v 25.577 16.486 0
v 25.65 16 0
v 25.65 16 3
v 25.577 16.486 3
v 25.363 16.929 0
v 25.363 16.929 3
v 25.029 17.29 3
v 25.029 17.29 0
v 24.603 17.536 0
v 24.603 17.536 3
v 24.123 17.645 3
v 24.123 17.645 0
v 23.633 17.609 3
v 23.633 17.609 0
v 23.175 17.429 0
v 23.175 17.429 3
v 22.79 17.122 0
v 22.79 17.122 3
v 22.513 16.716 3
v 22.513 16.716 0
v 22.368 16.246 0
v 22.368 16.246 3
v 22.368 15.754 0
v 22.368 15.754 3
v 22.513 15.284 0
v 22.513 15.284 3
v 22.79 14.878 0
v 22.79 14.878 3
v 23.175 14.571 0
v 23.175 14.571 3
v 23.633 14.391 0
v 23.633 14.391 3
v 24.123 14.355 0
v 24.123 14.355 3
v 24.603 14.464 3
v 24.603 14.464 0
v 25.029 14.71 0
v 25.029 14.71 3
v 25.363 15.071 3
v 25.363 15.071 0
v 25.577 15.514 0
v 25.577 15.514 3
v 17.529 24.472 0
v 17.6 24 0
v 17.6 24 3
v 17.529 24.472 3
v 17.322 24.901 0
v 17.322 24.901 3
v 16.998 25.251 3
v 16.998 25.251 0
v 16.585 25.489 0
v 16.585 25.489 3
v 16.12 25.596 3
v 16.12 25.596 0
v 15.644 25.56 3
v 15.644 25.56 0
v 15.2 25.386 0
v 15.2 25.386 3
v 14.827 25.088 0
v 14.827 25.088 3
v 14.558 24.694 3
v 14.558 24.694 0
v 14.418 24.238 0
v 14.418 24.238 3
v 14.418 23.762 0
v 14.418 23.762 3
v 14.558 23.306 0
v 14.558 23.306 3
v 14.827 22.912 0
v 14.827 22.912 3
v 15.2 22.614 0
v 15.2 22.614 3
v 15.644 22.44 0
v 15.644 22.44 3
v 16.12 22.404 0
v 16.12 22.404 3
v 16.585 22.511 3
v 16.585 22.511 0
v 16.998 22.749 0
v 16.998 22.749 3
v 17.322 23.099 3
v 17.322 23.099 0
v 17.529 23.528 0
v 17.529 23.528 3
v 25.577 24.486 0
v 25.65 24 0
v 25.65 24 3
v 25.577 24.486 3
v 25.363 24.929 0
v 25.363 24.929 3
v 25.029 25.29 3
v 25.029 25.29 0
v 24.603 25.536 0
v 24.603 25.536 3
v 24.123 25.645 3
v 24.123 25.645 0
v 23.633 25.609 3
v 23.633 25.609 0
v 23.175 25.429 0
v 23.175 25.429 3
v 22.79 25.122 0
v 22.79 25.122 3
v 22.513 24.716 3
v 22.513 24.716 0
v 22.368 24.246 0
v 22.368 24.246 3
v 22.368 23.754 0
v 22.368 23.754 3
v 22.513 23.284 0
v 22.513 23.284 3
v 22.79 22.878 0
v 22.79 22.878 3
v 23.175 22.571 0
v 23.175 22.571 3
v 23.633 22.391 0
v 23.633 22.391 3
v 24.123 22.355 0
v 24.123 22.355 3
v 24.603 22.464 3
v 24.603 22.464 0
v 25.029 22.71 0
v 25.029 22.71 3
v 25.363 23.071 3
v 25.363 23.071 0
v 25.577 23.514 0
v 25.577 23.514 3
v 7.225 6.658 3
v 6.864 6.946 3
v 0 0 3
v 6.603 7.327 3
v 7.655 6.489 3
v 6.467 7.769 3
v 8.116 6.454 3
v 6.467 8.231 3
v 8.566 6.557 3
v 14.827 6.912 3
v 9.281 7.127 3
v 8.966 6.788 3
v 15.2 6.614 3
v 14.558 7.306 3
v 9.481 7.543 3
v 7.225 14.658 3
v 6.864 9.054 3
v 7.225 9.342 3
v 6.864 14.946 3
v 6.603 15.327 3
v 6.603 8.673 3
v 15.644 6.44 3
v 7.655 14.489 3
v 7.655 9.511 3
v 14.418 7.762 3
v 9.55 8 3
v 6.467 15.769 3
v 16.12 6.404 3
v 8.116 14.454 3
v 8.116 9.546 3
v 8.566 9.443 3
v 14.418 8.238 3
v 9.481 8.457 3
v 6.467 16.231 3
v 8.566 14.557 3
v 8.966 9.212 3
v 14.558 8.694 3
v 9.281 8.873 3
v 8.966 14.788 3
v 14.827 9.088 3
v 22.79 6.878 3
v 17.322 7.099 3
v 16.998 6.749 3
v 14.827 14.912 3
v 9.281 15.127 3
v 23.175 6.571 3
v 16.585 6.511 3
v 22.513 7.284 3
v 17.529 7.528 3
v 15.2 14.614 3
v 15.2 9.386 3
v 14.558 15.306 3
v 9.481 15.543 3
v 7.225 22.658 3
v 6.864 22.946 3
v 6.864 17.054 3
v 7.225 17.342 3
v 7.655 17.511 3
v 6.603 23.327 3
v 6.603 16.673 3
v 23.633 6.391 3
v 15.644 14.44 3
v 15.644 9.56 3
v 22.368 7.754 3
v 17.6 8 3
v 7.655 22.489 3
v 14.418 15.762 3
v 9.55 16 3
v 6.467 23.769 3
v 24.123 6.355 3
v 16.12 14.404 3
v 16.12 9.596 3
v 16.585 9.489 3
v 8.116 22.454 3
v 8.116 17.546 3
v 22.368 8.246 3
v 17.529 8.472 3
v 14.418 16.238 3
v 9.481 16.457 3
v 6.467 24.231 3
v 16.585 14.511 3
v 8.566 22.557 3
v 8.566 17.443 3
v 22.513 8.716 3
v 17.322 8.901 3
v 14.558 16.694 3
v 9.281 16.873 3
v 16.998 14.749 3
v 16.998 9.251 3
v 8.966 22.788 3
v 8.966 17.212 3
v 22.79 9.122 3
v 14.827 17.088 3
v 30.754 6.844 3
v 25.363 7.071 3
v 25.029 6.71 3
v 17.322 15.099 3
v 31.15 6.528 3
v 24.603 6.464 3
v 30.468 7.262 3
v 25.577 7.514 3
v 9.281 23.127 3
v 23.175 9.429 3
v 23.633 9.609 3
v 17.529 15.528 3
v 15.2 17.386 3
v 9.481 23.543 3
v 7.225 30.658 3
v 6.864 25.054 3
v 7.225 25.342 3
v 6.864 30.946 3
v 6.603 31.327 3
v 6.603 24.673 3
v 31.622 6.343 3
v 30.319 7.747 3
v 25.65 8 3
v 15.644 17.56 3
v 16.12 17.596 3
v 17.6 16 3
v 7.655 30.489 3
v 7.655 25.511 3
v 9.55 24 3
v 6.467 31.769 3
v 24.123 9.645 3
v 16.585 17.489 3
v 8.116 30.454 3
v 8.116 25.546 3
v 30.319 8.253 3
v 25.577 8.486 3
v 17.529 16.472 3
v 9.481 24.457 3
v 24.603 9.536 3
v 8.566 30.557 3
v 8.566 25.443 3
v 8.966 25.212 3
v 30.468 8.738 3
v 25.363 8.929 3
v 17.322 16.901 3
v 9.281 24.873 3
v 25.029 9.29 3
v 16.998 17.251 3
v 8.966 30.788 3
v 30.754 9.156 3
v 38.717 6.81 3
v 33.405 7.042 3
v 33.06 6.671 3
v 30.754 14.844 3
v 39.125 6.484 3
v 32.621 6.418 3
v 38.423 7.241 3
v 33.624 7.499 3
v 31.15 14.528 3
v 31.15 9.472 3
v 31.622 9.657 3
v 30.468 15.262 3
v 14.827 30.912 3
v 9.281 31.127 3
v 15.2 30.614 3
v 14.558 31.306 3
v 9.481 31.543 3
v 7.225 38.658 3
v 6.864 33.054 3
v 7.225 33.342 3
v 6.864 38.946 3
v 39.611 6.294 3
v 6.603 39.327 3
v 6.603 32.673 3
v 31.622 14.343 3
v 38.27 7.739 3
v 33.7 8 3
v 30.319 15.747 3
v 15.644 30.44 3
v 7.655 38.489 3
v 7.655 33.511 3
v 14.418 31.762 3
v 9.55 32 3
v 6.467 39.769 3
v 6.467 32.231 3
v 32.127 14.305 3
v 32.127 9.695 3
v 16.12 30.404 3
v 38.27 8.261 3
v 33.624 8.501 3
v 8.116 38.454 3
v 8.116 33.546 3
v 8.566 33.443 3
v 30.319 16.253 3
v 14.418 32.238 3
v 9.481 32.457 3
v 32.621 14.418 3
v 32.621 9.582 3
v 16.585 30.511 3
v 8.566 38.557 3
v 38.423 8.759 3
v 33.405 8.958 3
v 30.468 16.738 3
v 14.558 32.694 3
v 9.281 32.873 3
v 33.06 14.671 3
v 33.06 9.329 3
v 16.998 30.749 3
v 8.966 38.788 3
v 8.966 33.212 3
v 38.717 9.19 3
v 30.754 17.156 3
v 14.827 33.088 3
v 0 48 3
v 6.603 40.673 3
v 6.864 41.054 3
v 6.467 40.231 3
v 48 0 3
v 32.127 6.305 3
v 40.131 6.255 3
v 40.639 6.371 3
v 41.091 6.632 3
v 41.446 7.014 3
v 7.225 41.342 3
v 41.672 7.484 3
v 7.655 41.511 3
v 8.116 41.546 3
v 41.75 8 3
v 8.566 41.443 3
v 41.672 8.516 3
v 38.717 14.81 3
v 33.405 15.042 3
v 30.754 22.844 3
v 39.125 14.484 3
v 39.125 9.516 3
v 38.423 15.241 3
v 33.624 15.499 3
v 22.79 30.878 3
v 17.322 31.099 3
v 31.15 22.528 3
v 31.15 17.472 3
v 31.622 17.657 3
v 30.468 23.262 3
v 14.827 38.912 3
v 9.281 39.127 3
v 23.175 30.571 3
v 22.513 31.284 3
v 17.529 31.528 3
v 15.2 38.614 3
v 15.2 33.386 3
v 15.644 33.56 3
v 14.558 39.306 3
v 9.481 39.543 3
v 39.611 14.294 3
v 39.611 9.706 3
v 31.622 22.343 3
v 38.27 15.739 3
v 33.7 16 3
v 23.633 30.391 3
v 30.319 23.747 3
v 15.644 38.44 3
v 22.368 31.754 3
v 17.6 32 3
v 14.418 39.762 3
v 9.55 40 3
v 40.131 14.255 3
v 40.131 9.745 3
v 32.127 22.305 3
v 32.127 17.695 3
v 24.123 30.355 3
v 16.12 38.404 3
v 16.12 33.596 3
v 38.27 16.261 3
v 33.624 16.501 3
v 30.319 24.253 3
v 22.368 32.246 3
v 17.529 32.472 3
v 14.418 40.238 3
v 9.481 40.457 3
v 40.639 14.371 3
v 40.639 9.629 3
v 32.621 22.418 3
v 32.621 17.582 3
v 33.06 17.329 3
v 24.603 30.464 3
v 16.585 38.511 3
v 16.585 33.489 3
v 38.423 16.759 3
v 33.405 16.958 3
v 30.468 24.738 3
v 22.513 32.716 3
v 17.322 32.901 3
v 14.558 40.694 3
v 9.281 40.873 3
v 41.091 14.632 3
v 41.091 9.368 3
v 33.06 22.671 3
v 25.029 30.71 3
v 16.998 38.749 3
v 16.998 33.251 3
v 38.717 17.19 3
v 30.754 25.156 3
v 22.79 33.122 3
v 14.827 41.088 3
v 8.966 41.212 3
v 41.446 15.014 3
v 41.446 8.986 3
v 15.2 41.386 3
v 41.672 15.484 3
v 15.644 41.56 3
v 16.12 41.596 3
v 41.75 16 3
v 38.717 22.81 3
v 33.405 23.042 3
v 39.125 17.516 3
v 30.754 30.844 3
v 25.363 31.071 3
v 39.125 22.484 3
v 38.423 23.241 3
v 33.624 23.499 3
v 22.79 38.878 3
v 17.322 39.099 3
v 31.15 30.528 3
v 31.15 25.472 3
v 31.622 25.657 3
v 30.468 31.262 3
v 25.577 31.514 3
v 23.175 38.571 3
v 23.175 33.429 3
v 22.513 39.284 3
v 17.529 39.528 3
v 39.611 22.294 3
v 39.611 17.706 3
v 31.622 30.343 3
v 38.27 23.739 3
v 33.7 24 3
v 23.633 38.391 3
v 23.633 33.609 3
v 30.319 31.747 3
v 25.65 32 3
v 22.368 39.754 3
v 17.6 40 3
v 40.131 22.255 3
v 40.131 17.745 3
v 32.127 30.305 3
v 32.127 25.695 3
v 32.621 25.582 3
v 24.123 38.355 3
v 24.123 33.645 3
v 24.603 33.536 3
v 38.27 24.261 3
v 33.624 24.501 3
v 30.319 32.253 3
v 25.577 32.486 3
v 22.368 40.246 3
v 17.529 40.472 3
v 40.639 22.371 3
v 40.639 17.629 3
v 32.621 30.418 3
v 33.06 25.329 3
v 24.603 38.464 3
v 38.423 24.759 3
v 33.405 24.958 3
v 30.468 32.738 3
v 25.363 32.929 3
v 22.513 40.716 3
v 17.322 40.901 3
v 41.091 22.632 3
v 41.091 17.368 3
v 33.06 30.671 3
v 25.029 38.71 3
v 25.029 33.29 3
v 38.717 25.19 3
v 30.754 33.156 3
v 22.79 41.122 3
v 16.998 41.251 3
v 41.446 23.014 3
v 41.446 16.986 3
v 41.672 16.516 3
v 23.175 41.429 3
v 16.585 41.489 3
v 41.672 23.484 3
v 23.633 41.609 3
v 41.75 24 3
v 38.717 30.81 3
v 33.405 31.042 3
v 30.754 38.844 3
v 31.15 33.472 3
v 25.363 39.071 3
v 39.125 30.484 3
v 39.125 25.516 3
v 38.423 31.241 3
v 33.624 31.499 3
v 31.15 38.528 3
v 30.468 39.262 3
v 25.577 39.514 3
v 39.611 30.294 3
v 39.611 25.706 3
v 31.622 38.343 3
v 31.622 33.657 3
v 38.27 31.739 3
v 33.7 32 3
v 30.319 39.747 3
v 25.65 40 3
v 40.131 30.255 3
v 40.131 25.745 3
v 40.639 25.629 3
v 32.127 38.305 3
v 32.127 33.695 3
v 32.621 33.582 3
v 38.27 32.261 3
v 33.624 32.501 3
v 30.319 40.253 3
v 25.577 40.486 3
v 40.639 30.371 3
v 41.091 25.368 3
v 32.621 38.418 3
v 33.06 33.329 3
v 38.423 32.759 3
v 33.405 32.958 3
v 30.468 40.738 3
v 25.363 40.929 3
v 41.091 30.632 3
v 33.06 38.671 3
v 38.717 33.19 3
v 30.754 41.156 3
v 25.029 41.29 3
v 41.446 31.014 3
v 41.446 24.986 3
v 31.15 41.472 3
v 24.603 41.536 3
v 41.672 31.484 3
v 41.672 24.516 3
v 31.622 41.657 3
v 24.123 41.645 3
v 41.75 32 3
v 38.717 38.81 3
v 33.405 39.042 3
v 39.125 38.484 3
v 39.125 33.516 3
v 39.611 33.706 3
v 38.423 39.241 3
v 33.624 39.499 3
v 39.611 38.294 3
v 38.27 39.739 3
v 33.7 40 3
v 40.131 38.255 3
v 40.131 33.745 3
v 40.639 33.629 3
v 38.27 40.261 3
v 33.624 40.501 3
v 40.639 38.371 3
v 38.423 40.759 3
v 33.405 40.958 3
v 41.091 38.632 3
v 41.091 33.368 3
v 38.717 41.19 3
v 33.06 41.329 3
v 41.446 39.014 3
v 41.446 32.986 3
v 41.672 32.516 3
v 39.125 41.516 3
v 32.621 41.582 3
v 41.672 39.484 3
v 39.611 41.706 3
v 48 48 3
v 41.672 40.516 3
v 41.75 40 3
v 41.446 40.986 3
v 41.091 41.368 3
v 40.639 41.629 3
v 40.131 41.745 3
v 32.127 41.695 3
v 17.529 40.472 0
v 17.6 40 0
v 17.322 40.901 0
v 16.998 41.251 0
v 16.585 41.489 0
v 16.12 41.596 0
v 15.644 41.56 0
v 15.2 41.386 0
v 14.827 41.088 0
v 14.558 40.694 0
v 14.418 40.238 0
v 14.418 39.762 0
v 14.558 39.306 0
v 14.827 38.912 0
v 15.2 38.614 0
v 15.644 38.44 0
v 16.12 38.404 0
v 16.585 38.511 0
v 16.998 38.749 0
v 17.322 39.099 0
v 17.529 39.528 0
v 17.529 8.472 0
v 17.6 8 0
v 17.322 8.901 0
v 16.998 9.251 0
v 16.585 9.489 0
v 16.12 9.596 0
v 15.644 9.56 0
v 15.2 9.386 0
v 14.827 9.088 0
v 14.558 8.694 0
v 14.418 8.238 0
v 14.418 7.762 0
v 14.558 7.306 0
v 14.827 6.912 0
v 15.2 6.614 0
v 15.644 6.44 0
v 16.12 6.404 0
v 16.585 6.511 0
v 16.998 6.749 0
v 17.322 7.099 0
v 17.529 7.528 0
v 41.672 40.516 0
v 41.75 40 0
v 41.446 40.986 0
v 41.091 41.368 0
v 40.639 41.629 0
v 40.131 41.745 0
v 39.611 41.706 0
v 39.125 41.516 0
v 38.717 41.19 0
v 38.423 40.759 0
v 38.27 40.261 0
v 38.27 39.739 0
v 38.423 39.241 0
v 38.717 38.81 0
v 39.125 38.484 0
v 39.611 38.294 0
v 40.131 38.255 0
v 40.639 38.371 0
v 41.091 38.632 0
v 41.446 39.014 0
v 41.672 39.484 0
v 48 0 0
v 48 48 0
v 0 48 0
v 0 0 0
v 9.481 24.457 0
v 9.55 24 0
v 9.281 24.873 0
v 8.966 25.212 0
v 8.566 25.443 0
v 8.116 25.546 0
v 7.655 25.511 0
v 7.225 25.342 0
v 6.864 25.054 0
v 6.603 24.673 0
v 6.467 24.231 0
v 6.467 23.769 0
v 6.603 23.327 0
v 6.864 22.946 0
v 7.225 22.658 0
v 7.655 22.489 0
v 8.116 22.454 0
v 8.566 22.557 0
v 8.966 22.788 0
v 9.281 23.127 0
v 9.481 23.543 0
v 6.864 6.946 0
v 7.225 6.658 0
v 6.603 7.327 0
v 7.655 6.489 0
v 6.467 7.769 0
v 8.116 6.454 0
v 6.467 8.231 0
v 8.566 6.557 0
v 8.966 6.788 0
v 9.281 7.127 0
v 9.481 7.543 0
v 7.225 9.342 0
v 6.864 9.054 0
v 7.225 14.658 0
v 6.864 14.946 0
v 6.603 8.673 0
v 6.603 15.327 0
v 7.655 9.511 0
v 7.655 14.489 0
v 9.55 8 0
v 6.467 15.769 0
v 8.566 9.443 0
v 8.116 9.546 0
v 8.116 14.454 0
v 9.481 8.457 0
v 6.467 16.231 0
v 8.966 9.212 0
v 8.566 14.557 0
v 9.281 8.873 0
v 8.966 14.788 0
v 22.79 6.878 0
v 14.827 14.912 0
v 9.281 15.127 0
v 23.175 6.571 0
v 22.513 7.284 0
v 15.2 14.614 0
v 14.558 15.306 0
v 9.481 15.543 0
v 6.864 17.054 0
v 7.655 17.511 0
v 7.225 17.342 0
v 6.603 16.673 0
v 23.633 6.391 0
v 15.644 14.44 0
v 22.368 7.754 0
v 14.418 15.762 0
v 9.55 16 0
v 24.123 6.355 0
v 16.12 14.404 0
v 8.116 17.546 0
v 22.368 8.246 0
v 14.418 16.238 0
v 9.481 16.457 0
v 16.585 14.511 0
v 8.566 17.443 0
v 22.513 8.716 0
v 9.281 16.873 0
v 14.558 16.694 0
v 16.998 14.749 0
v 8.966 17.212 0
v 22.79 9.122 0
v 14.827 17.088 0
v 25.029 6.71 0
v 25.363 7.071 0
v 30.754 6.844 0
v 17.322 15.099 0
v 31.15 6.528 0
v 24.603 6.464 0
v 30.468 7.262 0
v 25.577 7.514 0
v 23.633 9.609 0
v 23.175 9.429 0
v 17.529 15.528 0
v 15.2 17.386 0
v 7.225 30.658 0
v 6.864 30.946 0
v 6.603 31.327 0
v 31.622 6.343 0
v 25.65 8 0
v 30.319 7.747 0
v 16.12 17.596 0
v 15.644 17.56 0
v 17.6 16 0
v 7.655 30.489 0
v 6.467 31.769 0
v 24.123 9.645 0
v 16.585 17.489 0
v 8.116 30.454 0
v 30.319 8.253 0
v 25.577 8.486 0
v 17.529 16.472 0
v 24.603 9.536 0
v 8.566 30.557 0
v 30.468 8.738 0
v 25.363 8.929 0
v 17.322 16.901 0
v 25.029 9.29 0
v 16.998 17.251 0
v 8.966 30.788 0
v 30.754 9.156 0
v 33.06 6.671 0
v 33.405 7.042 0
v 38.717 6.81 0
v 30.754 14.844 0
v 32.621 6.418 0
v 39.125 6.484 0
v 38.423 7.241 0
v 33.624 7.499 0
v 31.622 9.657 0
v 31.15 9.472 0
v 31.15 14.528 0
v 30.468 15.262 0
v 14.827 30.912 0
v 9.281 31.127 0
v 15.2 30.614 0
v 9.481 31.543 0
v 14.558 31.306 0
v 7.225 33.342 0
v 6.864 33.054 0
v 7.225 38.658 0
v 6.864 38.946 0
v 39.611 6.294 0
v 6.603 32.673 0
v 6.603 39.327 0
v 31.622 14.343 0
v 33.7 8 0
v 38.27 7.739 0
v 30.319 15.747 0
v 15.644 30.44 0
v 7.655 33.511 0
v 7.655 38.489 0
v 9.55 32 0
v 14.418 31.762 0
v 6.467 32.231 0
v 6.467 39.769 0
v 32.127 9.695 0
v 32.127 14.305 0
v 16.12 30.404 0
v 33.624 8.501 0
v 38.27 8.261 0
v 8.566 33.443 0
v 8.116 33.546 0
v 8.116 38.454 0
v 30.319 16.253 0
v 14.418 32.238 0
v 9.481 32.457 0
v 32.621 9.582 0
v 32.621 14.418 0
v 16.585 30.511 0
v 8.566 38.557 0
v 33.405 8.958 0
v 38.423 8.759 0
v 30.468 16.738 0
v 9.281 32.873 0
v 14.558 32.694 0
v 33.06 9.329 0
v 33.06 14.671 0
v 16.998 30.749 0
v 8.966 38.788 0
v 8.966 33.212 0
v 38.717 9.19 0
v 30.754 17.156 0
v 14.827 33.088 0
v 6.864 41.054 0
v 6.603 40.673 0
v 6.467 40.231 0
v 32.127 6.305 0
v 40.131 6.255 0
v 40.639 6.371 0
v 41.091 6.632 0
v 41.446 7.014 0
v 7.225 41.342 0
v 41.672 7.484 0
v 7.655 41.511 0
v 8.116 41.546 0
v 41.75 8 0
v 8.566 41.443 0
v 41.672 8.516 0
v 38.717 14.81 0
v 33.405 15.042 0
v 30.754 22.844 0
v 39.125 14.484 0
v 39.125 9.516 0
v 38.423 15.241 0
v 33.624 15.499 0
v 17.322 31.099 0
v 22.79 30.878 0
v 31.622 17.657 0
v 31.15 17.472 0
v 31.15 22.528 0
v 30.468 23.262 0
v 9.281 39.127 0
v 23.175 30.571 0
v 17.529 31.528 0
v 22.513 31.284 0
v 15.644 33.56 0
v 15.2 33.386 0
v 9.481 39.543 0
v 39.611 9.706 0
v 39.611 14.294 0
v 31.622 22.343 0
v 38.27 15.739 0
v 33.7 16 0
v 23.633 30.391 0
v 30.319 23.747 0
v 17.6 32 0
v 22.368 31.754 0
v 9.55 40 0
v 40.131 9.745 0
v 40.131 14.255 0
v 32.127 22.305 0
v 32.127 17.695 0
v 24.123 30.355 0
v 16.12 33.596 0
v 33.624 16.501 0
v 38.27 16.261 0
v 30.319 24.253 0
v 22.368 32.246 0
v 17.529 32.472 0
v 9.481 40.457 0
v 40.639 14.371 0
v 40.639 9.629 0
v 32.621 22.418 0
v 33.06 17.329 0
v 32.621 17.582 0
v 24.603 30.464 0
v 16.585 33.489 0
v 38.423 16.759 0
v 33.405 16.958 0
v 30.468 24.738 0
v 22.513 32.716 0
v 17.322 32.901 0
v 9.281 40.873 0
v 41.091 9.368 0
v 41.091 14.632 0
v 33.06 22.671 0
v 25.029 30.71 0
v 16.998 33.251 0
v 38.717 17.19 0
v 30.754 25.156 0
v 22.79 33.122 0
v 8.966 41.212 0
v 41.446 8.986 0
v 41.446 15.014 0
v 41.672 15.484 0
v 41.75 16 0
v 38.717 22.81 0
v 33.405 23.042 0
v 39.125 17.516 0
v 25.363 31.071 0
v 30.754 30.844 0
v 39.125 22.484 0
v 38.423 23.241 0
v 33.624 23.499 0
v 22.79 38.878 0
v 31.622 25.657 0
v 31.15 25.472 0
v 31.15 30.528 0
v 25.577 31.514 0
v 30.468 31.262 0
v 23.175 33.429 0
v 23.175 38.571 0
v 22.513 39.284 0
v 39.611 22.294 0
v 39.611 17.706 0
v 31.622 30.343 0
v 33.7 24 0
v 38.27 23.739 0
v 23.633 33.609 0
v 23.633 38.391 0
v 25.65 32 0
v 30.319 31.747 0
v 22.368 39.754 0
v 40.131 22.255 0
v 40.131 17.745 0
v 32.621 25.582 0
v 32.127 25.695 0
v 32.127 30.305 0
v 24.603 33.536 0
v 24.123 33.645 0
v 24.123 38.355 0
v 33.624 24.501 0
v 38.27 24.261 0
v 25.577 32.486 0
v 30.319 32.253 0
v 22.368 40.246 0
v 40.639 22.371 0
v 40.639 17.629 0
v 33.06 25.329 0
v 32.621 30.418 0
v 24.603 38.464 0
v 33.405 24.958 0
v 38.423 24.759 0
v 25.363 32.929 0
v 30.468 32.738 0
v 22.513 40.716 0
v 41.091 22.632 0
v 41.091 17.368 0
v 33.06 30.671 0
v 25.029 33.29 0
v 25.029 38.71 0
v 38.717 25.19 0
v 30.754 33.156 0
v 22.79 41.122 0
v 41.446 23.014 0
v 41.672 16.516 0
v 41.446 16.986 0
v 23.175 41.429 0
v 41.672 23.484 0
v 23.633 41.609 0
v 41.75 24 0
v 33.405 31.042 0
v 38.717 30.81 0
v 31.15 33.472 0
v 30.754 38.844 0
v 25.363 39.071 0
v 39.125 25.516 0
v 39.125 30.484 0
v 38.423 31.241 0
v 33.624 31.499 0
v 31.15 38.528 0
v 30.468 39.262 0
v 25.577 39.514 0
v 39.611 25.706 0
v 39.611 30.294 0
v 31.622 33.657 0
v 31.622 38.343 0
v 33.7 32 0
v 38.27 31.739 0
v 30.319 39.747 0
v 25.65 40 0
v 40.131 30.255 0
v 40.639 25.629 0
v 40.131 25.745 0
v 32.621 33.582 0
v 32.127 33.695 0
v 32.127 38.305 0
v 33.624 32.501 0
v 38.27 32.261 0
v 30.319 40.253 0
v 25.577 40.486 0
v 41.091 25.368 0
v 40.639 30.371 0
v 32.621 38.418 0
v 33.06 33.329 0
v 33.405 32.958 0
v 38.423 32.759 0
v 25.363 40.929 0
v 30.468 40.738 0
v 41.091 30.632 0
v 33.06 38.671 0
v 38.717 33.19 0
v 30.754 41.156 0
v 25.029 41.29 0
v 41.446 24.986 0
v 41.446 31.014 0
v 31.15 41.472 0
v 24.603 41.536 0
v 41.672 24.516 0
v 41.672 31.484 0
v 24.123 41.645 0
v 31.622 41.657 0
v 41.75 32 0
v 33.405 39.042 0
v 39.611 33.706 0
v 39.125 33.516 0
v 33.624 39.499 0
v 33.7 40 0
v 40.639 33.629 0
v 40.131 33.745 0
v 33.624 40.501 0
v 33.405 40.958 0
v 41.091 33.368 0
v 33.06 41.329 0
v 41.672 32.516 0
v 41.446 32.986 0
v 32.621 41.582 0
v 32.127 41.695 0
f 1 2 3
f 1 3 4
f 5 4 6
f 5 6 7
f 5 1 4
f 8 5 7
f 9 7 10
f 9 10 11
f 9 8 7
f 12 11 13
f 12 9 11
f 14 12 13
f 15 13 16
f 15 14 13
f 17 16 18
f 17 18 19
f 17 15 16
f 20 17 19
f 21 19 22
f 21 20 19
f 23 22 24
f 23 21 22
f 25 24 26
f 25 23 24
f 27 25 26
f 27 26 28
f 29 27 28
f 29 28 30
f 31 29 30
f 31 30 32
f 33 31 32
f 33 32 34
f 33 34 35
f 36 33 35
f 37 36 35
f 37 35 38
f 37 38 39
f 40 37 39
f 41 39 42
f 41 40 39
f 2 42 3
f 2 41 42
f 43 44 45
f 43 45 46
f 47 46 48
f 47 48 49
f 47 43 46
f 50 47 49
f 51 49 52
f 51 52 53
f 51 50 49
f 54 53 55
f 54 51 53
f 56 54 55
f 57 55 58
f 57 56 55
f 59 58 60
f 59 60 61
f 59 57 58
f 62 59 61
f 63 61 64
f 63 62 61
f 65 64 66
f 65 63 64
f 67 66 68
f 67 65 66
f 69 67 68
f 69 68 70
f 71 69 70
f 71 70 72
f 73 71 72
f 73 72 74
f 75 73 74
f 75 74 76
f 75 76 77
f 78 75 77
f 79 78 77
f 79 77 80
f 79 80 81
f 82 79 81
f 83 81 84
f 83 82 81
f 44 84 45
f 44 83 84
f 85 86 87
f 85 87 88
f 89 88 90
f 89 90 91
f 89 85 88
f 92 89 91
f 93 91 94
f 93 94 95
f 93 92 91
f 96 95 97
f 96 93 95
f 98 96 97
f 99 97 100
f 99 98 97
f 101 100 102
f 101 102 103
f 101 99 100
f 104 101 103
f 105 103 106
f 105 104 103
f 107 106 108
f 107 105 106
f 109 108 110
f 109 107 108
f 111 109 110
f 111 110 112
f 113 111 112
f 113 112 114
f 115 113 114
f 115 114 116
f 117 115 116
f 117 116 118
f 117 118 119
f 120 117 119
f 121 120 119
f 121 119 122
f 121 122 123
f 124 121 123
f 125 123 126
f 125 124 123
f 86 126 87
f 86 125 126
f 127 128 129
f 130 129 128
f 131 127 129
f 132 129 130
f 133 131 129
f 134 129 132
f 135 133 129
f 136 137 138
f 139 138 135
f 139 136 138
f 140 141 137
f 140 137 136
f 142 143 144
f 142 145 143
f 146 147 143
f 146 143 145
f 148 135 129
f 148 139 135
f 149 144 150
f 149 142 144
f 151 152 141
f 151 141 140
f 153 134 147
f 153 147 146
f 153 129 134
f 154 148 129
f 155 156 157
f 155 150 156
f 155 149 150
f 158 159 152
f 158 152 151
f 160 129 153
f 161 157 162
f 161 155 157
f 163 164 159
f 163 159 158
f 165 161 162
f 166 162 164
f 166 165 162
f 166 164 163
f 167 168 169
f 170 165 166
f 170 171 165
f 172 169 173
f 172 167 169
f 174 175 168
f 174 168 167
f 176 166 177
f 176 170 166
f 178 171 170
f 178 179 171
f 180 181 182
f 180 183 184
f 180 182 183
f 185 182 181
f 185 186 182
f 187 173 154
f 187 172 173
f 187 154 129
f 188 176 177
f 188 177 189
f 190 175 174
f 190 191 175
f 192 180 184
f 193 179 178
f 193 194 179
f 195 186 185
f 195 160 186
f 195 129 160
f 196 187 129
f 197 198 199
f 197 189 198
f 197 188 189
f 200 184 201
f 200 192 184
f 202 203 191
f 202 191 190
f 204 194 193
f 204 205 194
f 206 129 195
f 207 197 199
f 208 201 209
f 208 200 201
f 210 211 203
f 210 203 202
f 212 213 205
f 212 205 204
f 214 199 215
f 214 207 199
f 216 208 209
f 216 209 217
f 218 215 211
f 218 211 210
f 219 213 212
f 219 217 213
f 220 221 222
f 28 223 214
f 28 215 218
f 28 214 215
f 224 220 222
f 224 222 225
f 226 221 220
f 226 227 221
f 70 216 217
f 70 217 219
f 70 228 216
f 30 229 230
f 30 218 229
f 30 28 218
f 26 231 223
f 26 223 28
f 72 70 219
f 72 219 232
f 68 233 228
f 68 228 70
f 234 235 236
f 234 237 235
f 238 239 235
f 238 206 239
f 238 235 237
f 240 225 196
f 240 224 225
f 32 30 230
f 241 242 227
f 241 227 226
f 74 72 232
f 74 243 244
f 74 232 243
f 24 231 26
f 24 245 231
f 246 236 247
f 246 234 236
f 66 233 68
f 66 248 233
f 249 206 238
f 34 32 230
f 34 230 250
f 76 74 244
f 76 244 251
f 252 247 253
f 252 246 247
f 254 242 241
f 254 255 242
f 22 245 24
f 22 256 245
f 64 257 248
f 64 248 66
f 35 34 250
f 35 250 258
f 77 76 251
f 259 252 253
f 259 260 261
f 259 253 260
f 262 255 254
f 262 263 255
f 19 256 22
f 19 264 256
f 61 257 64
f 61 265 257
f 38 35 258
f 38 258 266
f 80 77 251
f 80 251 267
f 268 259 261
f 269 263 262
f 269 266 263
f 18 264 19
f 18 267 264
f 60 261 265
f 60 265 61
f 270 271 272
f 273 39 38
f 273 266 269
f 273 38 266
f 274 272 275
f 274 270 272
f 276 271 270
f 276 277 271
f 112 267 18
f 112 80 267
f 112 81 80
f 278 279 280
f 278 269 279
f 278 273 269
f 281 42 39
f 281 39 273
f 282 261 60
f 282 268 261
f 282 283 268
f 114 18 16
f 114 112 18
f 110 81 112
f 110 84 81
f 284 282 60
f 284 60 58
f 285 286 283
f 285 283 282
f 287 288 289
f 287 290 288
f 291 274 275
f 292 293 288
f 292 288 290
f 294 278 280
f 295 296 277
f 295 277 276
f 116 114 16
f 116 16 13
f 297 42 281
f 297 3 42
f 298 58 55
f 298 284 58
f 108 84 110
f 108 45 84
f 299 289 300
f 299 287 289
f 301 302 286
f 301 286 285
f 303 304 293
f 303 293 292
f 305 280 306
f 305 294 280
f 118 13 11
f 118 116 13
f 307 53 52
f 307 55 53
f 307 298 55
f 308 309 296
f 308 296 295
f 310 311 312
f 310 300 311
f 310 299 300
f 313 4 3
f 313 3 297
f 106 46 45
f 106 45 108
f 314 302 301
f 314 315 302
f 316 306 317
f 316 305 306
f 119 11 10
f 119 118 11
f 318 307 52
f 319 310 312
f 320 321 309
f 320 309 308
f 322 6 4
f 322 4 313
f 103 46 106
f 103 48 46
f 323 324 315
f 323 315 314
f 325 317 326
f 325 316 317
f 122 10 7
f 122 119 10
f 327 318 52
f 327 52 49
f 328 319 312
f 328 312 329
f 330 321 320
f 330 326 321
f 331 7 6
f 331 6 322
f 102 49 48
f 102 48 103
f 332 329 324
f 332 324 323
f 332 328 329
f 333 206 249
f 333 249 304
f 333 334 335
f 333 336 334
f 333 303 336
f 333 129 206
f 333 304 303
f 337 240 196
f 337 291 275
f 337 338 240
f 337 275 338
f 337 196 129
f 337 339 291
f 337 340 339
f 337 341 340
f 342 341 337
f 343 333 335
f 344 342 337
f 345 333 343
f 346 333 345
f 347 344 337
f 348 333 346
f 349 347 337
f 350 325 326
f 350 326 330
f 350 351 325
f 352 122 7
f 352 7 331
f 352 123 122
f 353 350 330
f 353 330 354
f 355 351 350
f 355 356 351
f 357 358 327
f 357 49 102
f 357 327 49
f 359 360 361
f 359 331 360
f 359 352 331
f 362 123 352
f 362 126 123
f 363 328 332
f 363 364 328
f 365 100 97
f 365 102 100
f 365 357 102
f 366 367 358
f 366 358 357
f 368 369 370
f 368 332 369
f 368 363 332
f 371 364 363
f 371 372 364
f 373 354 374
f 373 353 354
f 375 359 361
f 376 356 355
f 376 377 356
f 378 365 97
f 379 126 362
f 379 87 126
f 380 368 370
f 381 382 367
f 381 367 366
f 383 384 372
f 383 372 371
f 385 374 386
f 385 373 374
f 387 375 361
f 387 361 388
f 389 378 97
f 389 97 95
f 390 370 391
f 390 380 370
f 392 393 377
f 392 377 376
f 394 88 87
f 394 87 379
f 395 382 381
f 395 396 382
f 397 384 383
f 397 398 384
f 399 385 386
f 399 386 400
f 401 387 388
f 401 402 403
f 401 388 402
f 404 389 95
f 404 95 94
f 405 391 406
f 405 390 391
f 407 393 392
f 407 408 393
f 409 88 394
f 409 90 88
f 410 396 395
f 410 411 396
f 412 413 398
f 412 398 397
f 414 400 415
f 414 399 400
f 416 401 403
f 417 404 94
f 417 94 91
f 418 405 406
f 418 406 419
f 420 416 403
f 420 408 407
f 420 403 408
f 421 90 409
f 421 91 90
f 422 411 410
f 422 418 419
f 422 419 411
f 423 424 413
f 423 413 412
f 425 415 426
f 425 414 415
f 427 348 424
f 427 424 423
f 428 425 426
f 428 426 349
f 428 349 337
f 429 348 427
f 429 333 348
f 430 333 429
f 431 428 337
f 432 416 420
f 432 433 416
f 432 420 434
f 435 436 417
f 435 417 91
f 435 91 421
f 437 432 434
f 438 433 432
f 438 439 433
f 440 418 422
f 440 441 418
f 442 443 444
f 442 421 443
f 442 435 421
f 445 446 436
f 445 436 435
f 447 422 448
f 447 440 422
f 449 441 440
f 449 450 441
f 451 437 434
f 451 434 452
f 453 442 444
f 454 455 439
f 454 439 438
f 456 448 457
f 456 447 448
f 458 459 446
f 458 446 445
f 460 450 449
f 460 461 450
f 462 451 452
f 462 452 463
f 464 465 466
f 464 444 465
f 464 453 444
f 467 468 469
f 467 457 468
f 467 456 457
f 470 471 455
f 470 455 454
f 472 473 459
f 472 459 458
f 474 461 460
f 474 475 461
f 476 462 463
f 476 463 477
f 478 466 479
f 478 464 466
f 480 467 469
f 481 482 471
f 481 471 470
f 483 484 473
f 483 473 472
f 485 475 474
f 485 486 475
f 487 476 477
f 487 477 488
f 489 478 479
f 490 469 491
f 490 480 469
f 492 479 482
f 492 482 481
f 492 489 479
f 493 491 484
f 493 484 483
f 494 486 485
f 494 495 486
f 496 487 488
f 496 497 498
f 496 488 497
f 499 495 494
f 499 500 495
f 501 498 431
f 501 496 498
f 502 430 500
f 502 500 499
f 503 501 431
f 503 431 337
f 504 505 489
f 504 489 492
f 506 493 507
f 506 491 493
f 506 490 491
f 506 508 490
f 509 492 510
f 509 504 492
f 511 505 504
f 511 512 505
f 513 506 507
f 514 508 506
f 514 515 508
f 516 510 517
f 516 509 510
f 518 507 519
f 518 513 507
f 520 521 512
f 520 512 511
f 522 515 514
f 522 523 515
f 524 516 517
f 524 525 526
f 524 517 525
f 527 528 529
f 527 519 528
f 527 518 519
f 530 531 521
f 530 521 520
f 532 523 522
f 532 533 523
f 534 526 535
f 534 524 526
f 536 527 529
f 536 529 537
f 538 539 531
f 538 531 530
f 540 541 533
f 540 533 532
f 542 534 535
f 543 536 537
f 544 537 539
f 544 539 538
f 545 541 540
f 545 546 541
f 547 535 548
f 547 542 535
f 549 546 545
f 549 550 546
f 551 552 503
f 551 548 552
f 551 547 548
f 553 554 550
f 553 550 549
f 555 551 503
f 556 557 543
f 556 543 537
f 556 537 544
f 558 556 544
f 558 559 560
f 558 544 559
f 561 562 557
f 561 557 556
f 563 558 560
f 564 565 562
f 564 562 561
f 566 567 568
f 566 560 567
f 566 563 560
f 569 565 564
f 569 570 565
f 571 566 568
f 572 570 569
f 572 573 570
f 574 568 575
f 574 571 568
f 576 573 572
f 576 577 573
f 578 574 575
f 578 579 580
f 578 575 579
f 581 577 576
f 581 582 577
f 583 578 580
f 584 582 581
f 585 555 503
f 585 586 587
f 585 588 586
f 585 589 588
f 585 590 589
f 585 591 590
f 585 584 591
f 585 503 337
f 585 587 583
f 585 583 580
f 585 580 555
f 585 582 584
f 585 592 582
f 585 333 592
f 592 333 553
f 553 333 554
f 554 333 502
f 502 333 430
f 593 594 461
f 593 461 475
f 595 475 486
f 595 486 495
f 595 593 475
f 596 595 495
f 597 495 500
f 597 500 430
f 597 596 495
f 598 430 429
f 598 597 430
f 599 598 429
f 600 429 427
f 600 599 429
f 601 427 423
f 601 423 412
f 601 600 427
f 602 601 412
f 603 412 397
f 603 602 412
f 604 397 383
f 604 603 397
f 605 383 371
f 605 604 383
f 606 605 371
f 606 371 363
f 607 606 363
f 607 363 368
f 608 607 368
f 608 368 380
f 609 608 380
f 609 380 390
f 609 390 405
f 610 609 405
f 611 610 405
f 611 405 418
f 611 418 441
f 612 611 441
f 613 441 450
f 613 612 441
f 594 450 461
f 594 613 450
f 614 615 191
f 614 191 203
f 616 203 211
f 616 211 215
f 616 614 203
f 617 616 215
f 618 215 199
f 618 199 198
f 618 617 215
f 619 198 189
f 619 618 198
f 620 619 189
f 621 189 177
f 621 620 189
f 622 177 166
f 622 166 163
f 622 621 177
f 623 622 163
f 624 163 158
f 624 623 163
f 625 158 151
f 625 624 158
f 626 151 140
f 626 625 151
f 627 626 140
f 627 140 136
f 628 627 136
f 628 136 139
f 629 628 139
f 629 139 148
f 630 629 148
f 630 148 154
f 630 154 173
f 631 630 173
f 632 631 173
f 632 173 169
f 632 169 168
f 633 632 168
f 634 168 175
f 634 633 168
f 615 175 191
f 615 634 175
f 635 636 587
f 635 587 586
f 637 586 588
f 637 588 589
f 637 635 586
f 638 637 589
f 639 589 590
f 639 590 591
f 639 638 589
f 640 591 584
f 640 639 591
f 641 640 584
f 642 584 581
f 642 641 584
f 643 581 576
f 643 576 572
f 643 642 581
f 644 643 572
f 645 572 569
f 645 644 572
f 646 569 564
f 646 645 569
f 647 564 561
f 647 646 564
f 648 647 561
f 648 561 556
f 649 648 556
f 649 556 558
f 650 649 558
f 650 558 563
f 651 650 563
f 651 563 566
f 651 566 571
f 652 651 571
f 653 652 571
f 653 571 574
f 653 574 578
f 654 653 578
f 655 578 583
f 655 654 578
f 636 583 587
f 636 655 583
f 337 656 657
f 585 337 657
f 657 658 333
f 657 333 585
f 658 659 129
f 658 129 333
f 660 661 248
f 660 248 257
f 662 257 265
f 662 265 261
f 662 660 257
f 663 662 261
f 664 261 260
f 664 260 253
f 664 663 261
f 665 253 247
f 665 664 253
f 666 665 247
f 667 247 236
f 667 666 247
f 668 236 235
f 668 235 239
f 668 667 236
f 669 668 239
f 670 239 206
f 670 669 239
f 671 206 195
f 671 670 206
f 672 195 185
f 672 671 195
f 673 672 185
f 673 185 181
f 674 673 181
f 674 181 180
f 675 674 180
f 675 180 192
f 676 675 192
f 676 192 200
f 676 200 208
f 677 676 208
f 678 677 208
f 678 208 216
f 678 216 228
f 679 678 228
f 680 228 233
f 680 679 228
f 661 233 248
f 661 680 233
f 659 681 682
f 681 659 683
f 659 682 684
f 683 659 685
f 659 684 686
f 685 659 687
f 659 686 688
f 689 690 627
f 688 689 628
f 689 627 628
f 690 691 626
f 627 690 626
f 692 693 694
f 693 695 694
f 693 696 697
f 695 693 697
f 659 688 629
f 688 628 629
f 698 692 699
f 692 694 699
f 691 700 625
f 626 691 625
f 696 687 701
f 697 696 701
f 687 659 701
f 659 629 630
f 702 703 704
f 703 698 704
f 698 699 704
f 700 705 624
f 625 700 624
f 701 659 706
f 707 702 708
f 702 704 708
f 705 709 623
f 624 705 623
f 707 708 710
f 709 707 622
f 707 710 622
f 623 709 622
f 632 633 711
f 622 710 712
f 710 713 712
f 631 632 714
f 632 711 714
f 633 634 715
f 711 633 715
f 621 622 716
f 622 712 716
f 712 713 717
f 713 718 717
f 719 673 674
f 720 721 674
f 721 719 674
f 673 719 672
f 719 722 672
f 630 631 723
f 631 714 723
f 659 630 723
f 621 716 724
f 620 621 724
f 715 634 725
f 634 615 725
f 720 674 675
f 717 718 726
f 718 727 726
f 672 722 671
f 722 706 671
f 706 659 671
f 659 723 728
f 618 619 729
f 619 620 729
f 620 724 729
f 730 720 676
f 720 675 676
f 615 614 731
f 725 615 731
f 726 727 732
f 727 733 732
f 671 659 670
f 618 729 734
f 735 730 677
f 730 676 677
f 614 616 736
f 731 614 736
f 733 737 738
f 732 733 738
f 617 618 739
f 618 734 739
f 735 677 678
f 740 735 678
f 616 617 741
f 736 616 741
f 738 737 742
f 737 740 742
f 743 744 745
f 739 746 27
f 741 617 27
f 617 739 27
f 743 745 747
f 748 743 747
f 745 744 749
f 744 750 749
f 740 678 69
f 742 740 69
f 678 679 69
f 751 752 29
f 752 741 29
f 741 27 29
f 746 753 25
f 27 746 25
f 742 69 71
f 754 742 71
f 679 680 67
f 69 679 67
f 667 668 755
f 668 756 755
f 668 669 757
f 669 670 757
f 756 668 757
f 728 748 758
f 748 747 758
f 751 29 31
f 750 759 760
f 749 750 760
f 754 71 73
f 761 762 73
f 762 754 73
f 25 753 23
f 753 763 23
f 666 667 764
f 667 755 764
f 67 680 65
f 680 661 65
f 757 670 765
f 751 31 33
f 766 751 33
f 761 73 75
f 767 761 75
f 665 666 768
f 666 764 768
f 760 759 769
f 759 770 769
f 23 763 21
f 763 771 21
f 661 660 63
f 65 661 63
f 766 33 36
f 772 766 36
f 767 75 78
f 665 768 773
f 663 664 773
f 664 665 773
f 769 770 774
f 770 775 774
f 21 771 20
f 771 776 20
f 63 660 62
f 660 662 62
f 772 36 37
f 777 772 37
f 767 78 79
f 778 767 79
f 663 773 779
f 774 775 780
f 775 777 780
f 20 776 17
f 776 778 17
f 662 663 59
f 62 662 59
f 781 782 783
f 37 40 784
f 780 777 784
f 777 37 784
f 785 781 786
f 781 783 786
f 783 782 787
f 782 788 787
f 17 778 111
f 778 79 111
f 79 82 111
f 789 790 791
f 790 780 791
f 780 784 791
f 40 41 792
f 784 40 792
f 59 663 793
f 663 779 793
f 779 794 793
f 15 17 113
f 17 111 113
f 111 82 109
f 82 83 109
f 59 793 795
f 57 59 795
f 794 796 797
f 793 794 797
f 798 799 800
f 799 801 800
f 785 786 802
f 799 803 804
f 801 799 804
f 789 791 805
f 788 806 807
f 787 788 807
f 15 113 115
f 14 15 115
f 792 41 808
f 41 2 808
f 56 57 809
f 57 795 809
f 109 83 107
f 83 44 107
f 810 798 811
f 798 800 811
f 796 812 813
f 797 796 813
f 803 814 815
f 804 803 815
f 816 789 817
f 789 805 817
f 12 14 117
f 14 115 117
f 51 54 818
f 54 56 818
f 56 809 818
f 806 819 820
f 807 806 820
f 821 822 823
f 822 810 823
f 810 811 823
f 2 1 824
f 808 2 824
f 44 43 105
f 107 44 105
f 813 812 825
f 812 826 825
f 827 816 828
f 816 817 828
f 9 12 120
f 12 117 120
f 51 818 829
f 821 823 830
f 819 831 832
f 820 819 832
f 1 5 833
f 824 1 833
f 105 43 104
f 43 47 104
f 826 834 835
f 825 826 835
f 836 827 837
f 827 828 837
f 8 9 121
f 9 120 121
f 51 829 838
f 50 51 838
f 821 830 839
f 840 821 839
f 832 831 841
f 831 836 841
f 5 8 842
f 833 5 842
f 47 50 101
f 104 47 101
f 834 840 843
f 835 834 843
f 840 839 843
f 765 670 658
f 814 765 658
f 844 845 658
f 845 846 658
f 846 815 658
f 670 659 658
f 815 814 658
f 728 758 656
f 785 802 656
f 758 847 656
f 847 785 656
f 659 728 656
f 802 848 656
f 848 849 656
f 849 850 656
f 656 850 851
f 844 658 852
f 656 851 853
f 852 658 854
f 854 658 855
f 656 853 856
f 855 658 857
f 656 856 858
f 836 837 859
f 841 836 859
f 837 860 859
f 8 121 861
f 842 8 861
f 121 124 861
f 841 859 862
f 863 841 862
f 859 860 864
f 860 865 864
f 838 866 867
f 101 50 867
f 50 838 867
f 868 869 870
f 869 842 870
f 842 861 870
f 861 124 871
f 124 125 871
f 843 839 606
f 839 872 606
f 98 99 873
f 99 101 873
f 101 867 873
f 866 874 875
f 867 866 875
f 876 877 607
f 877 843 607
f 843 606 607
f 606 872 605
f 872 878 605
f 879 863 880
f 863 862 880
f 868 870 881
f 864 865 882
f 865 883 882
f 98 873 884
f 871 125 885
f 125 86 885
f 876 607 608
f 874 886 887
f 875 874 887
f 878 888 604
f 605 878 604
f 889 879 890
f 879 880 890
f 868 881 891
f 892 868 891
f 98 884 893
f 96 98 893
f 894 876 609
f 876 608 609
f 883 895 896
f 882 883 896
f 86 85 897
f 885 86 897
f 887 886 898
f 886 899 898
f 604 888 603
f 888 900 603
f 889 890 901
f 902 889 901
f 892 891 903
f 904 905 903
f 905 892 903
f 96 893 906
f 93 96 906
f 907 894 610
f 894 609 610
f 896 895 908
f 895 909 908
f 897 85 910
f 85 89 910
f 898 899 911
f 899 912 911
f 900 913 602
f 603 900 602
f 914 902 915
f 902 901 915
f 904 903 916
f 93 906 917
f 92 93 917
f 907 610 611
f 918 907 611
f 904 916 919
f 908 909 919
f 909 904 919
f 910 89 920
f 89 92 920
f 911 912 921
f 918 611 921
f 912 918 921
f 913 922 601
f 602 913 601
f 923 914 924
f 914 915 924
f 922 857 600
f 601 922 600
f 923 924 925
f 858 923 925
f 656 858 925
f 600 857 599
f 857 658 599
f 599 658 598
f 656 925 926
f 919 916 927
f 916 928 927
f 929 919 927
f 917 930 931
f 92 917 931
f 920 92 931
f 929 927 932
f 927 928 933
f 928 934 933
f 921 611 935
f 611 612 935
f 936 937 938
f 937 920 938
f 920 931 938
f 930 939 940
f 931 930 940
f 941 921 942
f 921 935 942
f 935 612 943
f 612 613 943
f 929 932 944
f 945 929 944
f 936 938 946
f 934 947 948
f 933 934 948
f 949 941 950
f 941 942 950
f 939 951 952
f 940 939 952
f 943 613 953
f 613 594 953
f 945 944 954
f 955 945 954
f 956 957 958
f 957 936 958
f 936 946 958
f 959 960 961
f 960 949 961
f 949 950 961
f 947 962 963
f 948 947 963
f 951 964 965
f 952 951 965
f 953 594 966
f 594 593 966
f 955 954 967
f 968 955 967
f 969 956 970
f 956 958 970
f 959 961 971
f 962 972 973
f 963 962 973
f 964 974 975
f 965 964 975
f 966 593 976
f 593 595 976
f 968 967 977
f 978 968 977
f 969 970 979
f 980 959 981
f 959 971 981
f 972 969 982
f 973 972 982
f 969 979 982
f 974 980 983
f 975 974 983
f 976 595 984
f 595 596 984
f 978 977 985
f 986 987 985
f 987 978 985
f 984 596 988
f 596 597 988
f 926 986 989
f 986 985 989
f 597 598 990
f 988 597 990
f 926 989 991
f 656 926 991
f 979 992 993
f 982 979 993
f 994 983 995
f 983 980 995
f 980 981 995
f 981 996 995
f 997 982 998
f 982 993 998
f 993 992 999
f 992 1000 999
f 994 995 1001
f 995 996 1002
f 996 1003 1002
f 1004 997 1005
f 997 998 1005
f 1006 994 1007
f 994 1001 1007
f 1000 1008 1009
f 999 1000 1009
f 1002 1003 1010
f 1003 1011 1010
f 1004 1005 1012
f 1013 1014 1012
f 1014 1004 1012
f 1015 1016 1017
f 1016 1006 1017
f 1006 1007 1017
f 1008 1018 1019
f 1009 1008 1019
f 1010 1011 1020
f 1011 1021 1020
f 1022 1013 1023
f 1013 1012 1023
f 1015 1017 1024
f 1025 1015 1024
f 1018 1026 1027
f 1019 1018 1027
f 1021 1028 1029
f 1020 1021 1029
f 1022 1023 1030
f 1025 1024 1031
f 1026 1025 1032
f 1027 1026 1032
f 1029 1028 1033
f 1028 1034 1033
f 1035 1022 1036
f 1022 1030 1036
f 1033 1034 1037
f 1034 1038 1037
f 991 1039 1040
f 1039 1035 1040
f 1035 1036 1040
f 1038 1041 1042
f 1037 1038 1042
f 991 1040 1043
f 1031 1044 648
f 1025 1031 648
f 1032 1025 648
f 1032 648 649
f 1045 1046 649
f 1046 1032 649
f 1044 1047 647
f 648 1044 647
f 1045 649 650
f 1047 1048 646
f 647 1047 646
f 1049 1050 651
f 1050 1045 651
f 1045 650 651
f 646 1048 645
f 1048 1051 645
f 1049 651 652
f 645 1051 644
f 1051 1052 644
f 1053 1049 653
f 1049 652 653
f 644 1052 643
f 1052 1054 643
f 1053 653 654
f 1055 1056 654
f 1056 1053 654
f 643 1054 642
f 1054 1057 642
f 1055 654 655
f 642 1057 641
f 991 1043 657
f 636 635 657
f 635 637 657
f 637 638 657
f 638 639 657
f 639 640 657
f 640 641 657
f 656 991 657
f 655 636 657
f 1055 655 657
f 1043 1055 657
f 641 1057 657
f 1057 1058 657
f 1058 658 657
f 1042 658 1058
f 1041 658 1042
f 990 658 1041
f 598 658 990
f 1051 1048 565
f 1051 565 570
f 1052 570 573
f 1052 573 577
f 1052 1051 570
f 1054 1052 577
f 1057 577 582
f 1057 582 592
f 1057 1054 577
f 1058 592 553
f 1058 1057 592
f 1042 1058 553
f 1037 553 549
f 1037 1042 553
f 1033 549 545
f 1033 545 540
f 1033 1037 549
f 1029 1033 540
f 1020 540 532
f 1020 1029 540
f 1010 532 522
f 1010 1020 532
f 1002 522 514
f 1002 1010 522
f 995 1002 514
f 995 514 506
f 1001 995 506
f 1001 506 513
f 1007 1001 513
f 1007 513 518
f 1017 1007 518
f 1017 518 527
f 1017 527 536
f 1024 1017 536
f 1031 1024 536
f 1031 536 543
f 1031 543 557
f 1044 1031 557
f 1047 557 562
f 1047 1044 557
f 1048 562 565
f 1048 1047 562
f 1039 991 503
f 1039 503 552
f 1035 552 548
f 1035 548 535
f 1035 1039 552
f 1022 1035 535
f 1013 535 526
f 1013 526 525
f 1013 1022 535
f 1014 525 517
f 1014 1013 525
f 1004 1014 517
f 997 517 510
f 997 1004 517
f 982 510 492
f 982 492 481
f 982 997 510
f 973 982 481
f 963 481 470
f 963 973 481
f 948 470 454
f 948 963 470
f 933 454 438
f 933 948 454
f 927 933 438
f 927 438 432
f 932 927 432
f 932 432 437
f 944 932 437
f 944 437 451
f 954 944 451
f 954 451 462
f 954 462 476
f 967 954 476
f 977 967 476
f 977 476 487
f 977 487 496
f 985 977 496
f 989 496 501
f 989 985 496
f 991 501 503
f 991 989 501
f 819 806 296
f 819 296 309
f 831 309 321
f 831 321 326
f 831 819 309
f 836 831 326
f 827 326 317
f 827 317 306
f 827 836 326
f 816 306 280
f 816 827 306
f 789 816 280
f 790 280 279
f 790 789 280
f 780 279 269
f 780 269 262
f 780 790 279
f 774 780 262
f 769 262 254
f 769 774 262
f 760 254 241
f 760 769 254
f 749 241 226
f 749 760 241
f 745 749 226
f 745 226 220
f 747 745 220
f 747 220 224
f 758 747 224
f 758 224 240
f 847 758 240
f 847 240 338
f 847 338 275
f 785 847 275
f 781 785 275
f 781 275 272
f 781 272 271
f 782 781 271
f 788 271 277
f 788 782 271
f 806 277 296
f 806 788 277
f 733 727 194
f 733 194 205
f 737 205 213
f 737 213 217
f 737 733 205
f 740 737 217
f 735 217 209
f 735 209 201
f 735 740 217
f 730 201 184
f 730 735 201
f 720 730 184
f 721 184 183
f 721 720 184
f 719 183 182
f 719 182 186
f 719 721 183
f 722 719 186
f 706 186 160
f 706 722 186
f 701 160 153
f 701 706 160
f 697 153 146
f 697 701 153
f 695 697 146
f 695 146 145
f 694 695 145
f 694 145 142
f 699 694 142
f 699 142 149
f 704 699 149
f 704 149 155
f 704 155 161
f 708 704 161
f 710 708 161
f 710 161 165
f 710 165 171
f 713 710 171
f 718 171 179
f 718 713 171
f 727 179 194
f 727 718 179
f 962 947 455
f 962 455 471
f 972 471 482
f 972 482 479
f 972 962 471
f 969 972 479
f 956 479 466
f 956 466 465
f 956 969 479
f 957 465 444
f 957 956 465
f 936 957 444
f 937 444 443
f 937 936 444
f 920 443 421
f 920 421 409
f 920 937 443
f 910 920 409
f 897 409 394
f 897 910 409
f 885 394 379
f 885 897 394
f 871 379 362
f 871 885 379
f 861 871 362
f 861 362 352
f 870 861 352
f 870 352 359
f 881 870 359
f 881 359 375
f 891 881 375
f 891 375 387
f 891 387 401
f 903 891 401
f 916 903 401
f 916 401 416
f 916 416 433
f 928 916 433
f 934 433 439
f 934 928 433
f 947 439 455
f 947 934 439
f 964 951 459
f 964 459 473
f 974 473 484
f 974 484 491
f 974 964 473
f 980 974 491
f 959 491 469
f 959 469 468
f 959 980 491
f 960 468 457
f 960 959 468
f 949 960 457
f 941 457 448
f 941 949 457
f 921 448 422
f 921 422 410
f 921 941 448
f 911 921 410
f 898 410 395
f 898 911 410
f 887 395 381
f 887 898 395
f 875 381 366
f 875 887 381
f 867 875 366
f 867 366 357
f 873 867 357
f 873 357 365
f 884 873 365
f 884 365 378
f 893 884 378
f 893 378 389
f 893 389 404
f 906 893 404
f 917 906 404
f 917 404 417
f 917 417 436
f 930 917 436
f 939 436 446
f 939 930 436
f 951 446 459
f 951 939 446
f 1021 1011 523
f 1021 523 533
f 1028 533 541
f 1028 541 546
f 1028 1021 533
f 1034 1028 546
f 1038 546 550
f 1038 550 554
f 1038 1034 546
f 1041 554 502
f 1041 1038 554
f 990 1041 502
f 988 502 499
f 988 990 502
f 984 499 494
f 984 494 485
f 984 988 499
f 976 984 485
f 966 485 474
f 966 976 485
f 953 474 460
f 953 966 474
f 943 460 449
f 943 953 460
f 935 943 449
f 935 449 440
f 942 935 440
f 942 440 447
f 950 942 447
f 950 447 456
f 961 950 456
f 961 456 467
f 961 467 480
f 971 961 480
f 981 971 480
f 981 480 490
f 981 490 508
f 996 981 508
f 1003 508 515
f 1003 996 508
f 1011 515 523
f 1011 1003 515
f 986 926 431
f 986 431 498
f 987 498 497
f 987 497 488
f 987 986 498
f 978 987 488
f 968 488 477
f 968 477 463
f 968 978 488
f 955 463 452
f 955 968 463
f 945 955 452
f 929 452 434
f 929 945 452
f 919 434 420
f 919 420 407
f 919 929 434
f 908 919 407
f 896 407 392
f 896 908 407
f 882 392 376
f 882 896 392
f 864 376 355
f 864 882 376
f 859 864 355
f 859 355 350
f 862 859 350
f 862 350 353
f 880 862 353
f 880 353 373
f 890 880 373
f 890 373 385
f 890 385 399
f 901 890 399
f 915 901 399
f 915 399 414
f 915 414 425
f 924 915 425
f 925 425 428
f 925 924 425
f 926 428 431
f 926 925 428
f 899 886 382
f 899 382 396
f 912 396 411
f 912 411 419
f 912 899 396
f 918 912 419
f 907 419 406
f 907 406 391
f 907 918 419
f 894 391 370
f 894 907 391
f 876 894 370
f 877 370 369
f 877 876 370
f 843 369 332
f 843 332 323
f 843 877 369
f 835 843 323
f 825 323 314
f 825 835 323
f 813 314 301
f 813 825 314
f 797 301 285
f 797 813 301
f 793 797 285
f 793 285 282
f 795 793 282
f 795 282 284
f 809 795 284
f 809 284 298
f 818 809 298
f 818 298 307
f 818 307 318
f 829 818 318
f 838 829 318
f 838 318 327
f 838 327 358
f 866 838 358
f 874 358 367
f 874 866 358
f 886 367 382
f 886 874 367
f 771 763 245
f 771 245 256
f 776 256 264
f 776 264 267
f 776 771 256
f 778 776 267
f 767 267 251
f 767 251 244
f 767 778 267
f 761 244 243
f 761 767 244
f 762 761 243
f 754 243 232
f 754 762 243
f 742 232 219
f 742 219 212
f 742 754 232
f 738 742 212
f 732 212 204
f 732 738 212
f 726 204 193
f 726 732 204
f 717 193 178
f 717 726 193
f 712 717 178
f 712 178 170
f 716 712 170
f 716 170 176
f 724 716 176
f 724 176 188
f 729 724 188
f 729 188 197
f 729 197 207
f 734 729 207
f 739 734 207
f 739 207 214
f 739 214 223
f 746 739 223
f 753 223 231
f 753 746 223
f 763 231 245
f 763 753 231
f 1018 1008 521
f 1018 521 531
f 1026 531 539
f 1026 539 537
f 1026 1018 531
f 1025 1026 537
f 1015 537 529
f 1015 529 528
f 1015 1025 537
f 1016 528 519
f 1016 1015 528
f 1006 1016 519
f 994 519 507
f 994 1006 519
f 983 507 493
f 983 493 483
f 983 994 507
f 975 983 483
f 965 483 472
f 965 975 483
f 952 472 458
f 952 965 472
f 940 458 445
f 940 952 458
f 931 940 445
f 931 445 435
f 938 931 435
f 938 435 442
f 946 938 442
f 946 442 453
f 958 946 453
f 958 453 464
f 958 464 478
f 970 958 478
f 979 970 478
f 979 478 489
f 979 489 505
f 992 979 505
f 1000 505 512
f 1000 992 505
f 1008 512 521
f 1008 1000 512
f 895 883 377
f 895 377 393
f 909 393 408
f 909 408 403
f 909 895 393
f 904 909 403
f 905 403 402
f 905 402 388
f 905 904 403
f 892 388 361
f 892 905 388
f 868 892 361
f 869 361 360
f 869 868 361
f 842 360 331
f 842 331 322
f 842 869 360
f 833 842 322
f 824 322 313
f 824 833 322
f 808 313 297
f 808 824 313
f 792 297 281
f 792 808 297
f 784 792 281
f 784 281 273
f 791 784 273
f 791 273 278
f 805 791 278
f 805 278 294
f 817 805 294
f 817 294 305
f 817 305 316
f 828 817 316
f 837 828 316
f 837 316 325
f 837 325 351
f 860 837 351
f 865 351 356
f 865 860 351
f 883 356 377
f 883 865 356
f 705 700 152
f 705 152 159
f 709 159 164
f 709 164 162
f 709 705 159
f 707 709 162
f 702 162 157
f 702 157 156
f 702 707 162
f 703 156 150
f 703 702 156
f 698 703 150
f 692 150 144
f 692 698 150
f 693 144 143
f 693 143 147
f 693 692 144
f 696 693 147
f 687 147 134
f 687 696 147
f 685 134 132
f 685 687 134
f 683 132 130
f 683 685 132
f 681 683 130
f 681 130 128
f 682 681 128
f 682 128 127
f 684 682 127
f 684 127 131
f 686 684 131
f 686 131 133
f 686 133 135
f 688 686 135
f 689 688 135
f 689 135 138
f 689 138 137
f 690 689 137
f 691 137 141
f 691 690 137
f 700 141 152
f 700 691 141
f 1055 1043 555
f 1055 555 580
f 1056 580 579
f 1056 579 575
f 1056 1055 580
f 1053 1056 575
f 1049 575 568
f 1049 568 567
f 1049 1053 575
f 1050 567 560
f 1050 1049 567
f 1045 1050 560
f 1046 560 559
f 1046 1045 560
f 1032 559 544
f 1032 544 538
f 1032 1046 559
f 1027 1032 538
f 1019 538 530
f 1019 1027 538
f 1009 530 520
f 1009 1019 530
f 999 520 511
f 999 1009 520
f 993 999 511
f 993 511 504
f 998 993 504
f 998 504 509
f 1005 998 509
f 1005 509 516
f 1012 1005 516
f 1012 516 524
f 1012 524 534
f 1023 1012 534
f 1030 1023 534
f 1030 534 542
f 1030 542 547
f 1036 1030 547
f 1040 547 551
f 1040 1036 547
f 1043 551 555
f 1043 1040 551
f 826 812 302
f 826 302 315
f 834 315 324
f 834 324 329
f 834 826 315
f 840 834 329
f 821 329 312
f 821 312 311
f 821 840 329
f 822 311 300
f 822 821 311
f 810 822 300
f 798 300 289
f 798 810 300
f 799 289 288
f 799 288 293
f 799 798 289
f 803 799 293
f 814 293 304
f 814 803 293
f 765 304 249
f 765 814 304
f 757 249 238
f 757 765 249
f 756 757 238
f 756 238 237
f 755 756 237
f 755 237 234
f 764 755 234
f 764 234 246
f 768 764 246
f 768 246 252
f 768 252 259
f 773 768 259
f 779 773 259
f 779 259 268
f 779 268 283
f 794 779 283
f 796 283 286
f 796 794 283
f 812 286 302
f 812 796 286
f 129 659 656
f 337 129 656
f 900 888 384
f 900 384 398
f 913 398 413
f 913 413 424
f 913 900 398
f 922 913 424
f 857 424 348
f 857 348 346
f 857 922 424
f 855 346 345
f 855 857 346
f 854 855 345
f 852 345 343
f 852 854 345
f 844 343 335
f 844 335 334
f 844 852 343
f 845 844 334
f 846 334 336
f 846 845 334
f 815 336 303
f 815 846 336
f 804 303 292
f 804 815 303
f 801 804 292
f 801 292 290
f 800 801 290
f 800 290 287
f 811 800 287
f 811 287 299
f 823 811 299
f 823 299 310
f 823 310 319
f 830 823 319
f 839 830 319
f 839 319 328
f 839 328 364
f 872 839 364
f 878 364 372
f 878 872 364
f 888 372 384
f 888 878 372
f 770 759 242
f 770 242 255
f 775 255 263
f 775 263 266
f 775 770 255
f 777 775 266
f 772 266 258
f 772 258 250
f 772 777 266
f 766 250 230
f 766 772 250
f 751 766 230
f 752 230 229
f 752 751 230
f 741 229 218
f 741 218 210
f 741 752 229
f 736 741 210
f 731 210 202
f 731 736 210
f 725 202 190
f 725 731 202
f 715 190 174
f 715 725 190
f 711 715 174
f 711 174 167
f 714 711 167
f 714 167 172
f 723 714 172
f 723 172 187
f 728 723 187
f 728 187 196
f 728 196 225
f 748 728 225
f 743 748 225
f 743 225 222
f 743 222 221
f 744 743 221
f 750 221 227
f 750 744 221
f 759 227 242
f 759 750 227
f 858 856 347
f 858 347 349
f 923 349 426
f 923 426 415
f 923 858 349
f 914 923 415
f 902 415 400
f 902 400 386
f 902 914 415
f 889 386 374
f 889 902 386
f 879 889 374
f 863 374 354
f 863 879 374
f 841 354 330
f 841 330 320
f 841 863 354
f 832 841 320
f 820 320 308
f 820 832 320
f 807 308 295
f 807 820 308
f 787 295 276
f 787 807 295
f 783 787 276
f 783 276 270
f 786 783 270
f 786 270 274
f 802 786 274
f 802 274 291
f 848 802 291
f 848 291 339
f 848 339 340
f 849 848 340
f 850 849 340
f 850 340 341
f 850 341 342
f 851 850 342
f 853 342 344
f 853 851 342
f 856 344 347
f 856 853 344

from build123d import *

# Parameters (mm, degrees)
SKETCH_1_W      = 48
SKETCH_1_H      = 48
SKETCH_1_R      = 1.55
SKETCH_1_R_2    = 1.6
SKETCH_1_R_3    = 1.65
SKETCH_1_R_4    = 1.7
SKETCH_1_R_5    = 1.75
EXTRUDE_1_DEPTH = 3


with BuildPart() as part:
    # 草图1 → 凸台-拉伸1 (new body)
    with BuildSketch(Plane.XY):
        with Locations((24, 24)):
            Rectangle(SKETCH_1_W, SKETCH_1_H)
        with Locations((8, 8)):
            Circle(SKETCH_1_R, mode=Mode.SUBTRACT)
        with Locations((8, 16)):
            Circle(SKETCH_1_R, mode=Mode.SUBTRACT)
        with Locations((8, 24)):
            Circle(SKETCH_1_R, mode=Mode.SUBTRACT)
        with Locations((8, 32)):
            Circle(SKETCH_1_R, mode=Mode.SUBTRACT)
        with Locations((8, 40)):
            Circle(SKETCH_1_R, mode=Mode.SUBTRACT)
        with Locations((16, 8)):
            Circle(SKETCH_1_R_2, mode=Mode.SUBTRACT)
        with Locations((16, 16)):
            Circle(SKETCH_1_R_2, mode=Mode.SUBTRACT)
        with Locations((16, 24)):
            Circle(SKETCH_1_R_2, mode=Mode.SUBTRACT)
        with Locations((16, 32)):
            Circle(SKETCH_1_R_2, mode=Mode.SUBTRACT)
        with Locations((16, 40)):
            Circle(SKETCH_1_R_2, mode=Mode.SUBTRACT)
        with Locations((24, 8)):
            Circle(SKETCH_1_R_3, mode=Mode.SUBTRACT)
        with Locations((24, 16)):
            Circle(SKETCH_1_R_3, mode=Mode.SUBTRACT)
        with Locations((24, 24)):
            Circle(SKETCH_1_R_3, mode=Mode.SUBTRACT)
        with Locations((24, 32)):
            Circle(SKETCH_1_R_3, mode=Mode.SUBTRACT)
        with Locations((24, 40)):
            Circle(SKETCH_1_R_3, mode=Mode.SUBTRACT)
        with Locations((32, 8)):
            Circle(SKETCH_1_R_4, mode=Mode.SUBTRACT)
        with Locations((32, 16)):
            Circle(SKETCH_1_R_4, mode=Mode.SUBTRACT)
        with Locations((32, 24)):
            Circle(SKETCH_1_R_4, mode=Mode.SUBTRACT)
        with Locations((32, 32)):
            Circle(SKETCH_1_R_4, mode=Mode.SUBTRACT)
        with Locations((32, 40)):
            Circle(SKETCH_1_R_4, mode=Mode.SUBTRACT)
        with Locations((40, 8)):
            Circle(SKETCH_1_R_5, mode=Mode.SUBTRACT)
        with Locations((40, 16)):
            Circle(SKETCH_1_R_5, mode=Mode.SUBTRACT)
        with Locations((40, 24)):
            Circle(SKETCH_1_R_5, mode=Mode.SUBTRACT)
        with Locations((40, 32)):
            Circle(SKETCH_1_R_5, mode=Mode.SUBTRACT)
        with Locations((40, 40)):
            Circle(SKETCH_1_R_5, mode=Mode.SUBTRACT)
    extrude(amount=EXTRUDE_1_DEPTH)


solid = part.part
